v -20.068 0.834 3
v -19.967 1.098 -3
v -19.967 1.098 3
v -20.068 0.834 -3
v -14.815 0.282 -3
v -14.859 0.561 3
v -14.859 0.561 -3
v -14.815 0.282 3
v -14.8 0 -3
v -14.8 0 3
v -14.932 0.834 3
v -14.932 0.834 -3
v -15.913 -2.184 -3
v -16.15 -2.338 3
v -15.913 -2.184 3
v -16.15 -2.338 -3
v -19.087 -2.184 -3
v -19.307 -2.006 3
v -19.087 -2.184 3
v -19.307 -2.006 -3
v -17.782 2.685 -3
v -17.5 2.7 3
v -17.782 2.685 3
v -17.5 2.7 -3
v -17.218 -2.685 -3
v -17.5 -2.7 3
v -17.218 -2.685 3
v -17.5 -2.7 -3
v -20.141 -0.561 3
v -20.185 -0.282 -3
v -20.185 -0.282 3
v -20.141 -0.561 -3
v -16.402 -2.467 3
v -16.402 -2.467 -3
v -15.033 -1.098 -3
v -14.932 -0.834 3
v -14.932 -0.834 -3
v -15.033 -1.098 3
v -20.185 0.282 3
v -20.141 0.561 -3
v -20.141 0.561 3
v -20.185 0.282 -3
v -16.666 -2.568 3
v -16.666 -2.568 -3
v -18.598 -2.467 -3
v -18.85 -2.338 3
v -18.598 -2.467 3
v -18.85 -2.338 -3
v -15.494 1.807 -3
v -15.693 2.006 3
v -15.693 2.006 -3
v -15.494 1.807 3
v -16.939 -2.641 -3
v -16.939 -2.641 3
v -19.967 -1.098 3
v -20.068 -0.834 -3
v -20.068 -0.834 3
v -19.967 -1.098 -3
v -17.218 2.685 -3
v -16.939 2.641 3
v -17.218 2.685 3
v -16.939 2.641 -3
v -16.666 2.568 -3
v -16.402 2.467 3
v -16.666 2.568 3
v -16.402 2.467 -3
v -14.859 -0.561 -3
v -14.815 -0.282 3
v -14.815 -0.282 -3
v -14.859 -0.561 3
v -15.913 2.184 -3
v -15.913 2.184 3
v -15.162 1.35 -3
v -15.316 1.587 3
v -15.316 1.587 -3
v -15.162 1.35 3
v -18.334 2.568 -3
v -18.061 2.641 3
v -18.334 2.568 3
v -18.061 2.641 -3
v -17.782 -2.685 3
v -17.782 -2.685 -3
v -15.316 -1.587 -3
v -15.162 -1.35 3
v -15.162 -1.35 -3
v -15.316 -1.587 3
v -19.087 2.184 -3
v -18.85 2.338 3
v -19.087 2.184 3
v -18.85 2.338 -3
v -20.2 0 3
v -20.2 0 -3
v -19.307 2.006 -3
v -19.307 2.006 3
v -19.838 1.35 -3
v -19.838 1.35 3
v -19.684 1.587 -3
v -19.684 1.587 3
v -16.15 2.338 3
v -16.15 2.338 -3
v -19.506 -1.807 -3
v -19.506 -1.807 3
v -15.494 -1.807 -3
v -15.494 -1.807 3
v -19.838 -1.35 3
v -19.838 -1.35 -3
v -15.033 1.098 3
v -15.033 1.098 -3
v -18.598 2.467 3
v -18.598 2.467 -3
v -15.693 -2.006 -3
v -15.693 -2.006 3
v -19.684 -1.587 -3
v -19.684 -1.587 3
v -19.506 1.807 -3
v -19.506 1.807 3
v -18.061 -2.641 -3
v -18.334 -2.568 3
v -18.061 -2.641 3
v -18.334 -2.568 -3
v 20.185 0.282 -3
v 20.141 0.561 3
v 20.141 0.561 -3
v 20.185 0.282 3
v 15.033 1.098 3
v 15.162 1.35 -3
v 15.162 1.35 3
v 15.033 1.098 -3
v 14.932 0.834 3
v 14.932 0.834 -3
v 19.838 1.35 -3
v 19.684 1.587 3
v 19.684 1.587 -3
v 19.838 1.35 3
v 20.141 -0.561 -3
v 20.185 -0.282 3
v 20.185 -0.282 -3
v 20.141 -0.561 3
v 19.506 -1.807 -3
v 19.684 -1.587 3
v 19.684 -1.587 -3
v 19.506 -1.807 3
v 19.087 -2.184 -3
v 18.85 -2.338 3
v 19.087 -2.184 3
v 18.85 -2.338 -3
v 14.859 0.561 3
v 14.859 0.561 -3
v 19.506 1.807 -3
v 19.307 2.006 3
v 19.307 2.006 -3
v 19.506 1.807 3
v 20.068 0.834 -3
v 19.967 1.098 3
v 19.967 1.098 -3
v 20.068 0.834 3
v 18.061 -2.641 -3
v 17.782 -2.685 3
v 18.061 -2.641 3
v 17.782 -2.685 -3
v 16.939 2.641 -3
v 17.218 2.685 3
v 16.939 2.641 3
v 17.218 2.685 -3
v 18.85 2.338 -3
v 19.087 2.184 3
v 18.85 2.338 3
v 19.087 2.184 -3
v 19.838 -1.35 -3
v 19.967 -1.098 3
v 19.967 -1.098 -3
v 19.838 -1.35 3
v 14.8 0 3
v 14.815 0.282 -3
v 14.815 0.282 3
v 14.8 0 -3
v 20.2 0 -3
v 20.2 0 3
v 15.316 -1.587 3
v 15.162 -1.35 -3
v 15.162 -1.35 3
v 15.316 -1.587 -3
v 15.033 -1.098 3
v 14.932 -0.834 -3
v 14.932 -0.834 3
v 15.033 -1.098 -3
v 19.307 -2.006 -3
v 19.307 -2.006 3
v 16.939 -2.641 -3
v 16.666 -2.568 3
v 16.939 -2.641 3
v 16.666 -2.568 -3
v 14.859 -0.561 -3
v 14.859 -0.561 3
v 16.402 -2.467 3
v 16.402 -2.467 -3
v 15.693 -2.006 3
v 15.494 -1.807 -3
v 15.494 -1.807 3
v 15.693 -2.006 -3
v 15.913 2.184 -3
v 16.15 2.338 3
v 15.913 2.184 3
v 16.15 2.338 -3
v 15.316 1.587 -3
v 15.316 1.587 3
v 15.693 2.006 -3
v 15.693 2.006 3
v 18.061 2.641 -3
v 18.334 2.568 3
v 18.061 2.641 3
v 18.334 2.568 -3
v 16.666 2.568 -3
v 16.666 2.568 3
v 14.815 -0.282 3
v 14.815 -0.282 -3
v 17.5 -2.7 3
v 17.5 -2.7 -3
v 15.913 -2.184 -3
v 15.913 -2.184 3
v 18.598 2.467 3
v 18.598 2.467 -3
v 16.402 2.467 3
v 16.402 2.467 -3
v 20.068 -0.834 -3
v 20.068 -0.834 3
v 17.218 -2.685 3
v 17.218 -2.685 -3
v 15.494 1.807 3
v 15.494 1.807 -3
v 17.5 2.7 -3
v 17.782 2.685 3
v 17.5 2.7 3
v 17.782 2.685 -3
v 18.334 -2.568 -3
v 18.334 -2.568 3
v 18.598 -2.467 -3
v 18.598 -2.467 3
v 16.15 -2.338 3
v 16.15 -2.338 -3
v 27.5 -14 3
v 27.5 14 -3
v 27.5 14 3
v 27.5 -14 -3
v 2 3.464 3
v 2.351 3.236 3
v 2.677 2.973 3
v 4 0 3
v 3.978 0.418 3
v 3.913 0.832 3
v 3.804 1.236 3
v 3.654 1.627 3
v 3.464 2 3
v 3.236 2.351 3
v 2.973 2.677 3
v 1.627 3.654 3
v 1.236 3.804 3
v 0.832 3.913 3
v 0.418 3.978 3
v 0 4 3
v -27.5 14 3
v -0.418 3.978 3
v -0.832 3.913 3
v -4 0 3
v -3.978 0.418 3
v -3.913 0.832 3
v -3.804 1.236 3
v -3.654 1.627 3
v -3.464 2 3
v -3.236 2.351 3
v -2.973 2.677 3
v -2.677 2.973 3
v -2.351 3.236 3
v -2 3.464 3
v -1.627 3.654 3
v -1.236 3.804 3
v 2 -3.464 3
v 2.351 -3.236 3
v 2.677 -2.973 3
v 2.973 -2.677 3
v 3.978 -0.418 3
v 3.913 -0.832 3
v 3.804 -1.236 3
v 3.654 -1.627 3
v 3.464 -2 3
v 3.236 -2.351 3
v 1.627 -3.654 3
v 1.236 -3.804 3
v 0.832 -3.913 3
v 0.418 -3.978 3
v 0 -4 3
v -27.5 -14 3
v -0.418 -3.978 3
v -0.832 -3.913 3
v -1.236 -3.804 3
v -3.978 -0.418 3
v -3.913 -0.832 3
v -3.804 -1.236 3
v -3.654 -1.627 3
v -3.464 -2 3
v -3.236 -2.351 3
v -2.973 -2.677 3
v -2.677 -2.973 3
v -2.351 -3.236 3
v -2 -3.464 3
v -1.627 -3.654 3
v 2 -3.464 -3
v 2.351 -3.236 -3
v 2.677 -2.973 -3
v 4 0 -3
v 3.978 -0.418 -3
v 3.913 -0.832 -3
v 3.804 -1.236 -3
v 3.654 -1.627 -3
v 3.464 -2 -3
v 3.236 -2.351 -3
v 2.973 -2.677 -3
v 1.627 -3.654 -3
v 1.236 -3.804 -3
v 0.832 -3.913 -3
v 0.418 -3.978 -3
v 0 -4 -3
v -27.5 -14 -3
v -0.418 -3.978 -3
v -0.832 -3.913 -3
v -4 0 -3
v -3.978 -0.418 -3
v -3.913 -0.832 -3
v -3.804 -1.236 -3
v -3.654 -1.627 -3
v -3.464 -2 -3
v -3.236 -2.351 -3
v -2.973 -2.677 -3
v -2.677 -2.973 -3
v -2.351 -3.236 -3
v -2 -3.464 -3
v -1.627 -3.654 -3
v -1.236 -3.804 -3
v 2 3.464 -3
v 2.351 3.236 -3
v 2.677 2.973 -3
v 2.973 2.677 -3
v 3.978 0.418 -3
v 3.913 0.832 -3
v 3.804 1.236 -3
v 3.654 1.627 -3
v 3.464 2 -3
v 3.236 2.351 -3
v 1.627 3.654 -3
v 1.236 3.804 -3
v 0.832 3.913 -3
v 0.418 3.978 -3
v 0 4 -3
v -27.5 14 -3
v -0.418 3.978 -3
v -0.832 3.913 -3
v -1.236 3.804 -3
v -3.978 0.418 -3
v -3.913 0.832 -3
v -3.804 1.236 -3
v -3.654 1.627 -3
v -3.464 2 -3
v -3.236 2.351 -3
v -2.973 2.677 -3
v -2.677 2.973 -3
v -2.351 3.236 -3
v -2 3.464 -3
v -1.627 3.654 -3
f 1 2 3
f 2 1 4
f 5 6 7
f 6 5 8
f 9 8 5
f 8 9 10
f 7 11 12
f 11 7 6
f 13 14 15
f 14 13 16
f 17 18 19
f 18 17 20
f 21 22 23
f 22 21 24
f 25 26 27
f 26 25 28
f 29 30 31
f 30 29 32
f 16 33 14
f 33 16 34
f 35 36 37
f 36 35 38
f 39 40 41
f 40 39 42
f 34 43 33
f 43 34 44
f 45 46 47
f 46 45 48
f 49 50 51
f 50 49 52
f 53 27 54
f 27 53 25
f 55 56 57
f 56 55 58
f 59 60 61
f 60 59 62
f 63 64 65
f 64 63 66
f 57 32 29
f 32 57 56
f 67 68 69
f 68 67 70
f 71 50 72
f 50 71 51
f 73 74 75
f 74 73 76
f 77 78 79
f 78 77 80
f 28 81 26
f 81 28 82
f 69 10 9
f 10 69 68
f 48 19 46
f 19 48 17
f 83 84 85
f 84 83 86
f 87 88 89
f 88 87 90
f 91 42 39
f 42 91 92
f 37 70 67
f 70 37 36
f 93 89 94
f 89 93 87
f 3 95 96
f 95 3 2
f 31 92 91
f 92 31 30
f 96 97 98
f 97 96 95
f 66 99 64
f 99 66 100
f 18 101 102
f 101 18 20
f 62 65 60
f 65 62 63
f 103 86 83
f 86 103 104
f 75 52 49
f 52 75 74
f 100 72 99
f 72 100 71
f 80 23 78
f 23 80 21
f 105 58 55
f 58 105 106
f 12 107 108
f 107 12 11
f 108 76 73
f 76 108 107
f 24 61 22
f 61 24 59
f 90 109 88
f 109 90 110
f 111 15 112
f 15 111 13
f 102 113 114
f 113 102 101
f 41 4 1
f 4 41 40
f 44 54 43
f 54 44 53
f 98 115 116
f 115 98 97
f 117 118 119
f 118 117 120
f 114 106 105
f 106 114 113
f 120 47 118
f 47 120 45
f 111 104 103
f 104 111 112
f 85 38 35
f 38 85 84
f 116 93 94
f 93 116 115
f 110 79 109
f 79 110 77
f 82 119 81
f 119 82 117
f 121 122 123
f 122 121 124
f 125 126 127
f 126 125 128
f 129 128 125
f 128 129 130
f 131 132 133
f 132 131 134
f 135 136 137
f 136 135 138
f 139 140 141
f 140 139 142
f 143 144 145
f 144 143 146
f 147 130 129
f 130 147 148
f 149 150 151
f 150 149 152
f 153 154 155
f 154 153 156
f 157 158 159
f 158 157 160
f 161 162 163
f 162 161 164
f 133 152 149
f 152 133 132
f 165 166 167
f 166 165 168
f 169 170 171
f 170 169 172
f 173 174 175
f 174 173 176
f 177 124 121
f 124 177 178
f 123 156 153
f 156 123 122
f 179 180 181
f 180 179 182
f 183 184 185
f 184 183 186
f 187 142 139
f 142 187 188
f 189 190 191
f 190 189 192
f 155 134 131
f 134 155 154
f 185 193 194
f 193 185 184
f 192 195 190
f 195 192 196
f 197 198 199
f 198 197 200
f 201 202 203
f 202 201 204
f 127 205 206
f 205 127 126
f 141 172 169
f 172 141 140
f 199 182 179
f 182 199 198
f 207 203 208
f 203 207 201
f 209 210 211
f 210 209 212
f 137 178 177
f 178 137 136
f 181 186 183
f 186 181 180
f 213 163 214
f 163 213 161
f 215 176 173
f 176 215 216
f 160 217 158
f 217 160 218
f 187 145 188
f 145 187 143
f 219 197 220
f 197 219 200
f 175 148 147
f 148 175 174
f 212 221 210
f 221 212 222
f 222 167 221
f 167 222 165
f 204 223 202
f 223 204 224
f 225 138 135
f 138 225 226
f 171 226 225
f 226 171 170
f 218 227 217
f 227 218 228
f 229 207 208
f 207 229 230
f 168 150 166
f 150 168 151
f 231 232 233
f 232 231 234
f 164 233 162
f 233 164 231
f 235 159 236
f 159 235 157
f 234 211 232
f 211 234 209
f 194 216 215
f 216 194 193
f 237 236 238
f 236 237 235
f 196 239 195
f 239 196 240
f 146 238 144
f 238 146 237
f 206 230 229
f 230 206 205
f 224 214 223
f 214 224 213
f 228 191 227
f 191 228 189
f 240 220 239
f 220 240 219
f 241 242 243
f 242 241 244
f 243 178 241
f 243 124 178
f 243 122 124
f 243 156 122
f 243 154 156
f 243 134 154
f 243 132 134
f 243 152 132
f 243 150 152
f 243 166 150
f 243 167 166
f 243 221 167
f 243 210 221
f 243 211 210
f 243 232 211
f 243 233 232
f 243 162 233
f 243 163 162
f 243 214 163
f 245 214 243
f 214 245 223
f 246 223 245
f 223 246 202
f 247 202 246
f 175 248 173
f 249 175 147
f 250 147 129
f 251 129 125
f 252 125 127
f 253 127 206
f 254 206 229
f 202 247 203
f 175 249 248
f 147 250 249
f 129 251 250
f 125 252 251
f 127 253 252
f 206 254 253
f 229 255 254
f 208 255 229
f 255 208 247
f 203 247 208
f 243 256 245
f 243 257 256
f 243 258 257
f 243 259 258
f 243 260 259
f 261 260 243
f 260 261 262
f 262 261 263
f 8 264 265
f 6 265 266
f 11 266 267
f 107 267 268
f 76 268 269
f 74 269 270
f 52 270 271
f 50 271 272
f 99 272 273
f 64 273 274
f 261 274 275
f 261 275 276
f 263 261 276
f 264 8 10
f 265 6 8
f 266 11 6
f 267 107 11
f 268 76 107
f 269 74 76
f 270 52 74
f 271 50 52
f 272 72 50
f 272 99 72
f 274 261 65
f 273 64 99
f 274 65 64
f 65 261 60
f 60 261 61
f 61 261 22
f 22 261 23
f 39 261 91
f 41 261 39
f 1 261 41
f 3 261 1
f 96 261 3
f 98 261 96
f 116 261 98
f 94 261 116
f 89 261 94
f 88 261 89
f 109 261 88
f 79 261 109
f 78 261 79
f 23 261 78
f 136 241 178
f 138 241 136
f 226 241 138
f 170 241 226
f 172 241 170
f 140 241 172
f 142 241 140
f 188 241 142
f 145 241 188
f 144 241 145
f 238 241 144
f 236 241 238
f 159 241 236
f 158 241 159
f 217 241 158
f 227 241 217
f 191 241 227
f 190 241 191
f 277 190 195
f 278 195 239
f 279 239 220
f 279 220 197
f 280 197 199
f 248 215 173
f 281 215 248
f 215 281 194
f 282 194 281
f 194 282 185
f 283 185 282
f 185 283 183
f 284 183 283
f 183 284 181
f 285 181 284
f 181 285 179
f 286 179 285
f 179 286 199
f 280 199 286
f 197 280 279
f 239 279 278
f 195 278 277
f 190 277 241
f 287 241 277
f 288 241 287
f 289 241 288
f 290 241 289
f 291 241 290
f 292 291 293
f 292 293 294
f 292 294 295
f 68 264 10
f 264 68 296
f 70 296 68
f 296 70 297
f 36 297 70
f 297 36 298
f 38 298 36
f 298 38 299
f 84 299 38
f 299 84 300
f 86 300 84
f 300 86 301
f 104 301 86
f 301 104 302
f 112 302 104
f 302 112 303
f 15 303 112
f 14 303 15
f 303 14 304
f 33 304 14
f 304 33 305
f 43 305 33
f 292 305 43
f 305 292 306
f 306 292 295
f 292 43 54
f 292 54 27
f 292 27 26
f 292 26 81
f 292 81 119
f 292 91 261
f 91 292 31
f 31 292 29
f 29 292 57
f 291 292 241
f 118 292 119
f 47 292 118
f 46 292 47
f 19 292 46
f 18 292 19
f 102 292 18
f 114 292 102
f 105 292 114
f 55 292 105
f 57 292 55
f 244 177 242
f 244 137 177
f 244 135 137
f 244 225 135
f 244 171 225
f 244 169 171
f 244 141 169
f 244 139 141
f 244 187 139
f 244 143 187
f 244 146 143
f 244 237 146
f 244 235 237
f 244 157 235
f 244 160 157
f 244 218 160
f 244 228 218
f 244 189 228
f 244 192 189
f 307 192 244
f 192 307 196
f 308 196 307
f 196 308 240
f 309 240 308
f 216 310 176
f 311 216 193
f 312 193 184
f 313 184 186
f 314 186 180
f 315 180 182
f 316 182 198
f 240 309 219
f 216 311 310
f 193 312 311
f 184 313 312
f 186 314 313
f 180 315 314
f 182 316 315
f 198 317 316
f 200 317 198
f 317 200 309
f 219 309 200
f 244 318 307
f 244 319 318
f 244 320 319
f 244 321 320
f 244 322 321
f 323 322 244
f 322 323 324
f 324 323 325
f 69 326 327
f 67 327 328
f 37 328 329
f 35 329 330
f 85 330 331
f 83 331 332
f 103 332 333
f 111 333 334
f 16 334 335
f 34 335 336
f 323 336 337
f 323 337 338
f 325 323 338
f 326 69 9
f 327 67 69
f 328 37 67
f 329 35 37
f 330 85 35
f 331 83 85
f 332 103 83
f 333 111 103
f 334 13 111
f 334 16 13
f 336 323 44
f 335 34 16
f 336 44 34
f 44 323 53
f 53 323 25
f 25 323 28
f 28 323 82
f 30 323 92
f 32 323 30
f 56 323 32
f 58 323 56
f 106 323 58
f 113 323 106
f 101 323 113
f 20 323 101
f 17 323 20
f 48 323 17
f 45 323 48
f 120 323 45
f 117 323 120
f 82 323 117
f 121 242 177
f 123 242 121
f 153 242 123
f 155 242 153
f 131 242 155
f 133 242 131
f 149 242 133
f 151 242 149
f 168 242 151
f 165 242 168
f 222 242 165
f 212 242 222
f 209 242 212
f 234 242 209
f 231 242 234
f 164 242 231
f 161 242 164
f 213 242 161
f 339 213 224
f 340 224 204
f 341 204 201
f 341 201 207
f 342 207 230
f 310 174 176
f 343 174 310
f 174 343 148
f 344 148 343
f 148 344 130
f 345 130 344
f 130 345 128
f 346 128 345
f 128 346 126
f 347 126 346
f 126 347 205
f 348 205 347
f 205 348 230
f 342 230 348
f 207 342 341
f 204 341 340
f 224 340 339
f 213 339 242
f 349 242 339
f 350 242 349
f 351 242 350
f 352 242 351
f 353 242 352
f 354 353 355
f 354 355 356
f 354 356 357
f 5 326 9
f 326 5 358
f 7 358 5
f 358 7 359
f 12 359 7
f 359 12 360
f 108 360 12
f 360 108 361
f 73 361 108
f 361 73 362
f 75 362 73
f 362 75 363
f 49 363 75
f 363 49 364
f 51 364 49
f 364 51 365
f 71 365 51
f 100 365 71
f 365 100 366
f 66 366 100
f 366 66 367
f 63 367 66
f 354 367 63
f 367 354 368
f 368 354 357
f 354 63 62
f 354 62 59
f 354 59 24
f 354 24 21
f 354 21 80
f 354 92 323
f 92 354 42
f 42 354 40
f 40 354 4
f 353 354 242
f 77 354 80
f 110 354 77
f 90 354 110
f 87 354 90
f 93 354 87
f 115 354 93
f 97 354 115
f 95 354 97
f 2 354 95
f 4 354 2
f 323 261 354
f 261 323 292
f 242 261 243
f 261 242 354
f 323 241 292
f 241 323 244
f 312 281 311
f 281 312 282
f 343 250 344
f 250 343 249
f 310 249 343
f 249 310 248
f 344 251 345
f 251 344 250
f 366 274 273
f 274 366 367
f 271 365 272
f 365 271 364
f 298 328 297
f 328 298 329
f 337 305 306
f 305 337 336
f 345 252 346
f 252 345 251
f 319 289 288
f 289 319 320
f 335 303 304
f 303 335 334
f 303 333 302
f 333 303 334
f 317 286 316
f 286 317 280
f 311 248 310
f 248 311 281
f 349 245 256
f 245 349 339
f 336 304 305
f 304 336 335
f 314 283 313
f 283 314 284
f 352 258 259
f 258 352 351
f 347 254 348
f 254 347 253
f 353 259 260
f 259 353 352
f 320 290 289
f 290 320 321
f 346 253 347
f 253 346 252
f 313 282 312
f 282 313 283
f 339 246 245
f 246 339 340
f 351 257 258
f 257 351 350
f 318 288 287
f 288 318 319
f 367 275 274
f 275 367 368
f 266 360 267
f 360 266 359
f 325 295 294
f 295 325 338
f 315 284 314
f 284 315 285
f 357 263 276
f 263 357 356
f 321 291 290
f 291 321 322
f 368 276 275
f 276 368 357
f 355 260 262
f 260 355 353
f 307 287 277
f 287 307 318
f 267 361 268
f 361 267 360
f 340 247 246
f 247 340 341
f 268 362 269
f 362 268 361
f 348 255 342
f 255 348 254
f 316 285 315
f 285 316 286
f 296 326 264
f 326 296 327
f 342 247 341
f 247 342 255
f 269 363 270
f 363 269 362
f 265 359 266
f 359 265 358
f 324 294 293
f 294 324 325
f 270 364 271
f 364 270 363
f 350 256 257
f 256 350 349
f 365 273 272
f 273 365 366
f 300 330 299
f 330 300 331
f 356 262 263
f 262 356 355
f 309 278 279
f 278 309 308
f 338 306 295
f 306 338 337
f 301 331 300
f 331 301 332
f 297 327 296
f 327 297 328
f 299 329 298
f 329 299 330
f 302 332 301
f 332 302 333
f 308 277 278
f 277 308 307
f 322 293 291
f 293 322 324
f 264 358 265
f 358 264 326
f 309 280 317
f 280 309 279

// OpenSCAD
// Rod-end mounting plate.
$fn = 60;
eps = 0.02;
plate_l = 55;
plate_w = 28;
plate_t = 6;
bore_d = 8;
difference() {
    cube([plate_l, plate_w, plate_t], center = true);
    translate([0, 0, -plate_t / 2 - eps]) cylinder(d = bore_d, h = plate_t + 2 * eps);
    for (x = [-plate_l / 2 + 10, plate_l / 2 - 10])
        translate([x, 0, -plate_t / 2 - eps]) cylinder(d = 5.4, h = plate_t + 2 * eps);
}
